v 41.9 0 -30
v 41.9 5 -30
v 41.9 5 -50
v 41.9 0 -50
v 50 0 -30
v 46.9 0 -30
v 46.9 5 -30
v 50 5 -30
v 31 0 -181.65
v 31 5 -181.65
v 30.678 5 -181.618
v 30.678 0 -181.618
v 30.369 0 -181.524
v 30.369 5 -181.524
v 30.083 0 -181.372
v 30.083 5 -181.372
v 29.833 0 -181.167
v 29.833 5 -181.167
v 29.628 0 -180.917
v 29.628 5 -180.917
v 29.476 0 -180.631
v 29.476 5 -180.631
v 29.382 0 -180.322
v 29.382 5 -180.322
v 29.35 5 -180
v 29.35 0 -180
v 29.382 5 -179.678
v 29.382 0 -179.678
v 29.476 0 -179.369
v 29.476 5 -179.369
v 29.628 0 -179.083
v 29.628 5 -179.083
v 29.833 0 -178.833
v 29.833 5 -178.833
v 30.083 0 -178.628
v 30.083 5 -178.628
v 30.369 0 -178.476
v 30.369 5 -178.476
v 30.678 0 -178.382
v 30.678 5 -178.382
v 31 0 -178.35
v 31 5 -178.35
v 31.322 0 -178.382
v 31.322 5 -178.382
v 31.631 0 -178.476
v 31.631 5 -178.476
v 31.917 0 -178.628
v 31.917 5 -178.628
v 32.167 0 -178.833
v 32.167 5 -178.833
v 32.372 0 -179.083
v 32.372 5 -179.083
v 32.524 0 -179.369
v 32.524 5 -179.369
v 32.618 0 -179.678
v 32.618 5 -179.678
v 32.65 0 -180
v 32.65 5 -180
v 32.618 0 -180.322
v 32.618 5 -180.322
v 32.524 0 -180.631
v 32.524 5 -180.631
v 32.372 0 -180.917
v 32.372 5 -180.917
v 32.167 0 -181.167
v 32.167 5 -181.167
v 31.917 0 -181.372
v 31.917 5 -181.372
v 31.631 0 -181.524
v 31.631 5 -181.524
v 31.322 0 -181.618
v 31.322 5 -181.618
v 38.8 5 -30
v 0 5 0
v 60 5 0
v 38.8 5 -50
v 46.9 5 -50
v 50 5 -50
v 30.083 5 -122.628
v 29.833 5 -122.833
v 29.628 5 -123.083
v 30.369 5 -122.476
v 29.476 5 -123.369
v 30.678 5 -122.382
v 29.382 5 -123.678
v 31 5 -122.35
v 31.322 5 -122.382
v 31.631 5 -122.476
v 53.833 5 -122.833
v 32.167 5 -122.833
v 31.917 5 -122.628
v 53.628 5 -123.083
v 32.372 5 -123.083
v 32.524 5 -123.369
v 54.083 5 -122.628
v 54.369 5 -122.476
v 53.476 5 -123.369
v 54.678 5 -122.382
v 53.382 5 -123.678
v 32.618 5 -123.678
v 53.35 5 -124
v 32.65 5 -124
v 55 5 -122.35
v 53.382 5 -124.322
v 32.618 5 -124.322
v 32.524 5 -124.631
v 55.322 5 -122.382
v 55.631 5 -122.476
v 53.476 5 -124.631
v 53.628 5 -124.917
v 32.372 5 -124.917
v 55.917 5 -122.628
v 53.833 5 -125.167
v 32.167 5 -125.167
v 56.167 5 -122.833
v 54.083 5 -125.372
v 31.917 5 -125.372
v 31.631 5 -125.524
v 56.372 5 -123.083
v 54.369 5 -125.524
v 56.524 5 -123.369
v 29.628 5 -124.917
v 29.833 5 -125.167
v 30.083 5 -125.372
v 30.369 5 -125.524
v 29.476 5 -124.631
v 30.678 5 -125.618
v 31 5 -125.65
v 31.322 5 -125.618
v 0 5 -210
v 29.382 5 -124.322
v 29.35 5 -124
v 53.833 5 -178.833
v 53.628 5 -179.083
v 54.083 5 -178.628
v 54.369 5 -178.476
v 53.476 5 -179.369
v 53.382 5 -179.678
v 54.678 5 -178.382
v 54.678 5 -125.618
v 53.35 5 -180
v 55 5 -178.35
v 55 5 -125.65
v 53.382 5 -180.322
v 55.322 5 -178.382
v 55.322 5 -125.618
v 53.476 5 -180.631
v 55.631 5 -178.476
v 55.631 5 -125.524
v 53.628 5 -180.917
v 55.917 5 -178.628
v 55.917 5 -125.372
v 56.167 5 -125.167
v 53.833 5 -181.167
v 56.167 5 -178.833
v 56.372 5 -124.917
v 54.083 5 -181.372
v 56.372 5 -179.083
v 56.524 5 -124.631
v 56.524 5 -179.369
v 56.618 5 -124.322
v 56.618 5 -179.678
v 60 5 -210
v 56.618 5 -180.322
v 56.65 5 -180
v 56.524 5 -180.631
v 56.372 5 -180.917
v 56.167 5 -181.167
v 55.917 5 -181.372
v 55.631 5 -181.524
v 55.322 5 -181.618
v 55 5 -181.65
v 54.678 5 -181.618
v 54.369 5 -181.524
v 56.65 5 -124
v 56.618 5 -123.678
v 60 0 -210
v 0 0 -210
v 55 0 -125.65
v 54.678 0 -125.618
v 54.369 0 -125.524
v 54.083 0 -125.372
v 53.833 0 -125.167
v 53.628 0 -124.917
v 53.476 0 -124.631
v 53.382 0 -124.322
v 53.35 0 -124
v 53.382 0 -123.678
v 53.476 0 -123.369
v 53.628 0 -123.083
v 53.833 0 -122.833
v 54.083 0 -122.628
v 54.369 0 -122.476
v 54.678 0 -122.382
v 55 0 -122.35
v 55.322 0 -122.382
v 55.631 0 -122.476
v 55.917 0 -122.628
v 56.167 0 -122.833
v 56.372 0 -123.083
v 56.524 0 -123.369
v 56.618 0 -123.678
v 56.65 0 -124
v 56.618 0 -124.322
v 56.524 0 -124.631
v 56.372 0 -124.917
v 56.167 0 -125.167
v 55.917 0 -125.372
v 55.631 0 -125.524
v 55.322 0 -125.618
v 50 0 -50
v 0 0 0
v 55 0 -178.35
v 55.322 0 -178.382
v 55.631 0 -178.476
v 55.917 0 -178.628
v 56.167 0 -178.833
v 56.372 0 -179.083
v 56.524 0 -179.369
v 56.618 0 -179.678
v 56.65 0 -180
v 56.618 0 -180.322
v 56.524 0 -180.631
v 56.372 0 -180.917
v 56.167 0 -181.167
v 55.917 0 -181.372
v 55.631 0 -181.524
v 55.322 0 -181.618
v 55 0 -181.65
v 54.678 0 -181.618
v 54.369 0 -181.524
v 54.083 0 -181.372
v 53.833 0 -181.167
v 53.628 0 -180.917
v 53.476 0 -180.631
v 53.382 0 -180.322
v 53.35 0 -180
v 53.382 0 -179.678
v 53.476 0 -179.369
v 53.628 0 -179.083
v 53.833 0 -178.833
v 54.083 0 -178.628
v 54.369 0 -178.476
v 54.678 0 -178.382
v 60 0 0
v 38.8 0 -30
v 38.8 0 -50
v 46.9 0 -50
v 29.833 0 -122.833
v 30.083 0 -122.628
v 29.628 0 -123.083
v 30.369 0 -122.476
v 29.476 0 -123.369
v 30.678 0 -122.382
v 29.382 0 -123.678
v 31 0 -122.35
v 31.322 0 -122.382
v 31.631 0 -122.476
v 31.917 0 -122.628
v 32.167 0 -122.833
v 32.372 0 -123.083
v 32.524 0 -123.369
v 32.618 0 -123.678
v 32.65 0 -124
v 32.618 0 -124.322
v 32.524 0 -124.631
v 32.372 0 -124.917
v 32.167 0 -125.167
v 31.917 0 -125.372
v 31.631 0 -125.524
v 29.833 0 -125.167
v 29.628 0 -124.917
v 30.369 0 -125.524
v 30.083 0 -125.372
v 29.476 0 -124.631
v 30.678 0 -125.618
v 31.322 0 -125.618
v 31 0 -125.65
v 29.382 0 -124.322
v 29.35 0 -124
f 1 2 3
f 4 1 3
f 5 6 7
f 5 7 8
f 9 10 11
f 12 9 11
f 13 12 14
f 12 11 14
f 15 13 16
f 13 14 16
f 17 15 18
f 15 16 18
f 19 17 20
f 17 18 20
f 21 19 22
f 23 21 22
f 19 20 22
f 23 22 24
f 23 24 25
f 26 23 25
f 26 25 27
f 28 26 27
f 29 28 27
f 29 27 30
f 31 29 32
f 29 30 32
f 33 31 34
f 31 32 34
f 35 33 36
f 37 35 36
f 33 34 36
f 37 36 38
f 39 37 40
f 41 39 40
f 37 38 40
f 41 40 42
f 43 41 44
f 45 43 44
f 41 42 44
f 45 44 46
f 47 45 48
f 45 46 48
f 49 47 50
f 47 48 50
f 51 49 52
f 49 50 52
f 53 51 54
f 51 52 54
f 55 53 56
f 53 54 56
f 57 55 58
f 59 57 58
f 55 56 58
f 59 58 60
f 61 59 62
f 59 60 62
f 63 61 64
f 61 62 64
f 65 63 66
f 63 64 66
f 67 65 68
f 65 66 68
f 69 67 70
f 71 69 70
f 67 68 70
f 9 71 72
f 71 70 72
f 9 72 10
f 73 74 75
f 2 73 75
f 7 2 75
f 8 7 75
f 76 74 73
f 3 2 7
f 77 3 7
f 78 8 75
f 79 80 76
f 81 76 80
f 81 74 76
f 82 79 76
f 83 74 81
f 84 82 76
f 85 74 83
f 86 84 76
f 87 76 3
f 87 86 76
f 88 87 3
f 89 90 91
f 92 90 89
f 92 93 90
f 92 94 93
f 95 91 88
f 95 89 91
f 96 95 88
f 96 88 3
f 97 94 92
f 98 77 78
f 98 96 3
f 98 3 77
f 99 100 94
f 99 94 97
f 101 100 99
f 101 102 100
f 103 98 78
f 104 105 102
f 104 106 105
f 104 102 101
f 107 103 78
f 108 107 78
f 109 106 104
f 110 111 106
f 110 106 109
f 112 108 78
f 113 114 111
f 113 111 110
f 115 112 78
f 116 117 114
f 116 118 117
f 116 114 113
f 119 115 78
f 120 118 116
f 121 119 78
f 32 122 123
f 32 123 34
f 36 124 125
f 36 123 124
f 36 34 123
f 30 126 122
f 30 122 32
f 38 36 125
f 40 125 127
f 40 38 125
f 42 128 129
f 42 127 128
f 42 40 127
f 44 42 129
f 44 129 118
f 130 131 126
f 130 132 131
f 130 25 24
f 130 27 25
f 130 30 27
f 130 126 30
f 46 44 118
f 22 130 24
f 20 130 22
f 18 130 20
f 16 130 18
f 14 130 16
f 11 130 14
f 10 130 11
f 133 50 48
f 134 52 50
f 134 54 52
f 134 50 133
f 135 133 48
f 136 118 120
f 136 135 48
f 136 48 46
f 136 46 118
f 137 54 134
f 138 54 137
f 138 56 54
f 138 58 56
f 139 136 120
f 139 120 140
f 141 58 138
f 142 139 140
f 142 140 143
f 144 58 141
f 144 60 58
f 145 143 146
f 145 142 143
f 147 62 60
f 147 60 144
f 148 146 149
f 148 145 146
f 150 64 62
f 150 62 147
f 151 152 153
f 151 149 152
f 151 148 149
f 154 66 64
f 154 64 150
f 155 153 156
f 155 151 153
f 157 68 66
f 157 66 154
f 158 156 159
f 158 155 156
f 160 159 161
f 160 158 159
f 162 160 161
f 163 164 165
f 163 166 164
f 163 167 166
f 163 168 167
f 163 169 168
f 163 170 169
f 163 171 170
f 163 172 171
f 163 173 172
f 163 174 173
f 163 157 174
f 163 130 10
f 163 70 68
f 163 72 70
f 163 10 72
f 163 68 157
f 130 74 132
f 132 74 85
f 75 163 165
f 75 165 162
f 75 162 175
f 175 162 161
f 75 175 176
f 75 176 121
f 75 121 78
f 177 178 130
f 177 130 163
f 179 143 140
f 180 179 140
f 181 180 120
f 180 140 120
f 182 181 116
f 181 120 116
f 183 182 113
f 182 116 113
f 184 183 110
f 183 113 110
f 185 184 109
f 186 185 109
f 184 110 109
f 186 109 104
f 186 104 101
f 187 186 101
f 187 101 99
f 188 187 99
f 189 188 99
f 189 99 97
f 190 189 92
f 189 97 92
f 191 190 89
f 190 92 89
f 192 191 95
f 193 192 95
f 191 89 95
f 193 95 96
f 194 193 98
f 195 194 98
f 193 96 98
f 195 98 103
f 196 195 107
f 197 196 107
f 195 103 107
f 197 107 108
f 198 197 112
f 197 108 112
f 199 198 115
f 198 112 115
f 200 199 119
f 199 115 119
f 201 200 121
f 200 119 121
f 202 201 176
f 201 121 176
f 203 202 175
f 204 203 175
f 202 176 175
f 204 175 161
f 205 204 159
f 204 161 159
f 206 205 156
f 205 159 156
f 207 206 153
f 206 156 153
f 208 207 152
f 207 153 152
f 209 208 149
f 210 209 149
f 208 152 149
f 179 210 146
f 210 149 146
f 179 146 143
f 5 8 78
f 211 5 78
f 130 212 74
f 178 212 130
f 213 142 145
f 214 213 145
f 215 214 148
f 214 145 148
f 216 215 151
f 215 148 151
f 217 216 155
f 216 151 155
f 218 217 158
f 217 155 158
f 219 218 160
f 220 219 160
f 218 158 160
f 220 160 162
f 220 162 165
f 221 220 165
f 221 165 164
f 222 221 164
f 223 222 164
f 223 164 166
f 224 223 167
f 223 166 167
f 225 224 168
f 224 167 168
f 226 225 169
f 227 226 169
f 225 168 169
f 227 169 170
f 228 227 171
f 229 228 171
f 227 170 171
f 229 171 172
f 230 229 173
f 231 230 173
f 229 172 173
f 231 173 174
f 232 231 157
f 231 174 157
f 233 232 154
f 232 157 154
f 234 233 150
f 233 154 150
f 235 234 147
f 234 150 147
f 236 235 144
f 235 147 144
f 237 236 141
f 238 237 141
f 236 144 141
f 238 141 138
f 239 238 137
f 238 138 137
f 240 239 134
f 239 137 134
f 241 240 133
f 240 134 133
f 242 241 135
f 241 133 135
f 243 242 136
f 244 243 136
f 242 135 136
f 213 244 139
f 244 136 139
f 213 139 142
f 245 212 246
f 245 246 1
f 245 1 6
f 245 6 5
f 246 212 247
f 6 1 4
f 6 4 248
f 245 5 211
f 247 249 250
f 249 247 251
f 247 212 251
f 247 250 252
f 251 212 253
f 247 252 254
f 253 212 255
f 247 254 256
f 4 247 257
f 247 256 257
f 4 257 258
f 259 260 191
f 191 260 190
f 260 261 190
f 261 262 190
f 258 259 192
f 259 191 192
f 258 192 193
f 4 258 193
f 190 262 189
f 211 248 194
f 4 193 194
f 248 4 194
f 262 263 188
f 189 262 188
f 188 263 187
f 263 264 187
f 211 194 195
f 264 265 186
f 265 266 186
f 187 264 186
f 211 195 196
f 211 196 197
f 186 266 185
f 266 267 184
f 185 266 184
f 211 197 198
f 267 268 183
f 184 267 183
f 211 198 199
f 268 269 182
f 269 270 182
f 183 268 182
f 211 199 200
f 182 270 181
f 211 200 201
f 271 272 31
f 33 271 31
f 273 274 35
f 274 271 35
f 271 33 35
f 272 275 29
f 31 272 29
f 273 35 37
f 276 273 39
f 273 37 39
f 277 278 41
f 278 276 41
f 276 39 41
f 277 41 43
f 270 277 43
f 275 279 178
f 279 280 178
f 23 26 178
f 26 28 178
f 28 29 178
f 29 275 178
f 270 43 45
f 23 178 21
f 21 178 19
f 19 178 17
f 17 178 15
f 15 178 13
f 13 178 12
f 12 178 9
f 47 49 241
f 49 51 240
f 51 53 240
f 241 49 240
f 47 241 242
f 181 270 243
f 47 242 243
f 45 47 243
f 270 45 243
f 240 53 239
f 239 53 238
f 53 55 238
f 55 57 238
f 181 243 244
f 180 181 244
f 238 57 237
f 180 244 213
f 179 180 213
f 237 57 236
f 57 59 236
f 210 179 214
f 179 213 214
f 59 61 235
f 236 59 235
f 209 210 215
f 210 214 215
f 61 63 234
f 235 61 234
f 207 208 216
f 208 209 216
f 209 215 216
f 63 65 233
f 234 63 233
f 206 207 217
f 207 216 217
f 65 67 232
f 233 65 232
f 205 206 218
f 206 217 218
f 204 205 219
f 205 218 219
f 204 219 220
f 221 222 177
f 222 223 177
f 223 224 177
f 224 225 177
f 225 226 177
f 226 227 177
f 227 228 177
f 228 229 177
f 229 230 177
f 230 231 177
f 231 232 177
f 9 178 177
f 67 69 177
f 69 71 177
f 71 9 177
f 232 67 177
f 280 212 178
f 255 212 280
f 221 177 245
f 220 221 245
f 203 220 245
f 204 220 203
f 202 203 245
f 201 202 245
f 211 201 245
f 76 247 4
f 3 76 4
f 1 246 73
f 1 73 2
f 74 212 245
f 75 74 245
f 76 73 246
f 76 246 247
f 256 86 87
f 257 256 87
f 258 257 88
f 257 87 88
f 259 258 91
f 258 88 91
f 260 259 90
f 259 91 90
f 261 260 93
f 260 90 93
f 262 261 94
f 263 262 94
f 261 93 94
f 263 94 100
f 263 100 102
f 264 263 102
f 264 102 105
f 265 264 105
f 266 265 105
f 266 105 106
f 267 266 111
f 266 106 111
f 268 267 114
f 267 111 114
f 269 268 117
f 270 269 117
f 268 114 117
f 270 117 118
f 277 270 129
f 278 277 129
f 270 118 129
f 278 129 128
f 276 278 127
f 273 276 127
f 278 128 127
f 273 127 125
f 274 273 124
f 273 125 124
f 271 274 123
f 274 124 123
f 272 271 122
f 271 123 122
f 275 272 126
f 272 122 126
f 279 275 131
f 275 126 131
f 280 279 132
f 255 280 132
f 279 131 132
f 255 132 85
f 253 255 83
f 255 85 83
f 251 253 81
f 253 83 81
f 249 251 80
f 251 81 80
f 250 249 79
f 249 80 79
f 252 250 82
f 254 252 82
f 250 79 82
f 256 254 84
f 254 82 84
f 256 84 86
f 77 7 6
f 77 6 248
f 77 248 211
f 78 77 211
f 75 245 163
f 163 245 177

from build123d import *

# Parameters (mm, degrees)
SKETCH1_W           = 60
SKETCH1_H           = 210
BOSS_EXTRUDE1_DEPTH = 5
SKETCH2_W           = 3.1
SKETCH2_H           = 20
CUT_EXTRUDE1_DEPTH  = 5
SKETCH3_R           = 1.65
CUT_EXTRUDE2_DEPTH  = 5


with BuildPart() as part:
    # Sketch1 → Boss-Extrude1 (new body)
    with BuildSketch(Plane(origin=(0, 0, 0), x_dir=(1, 0, 0), z_dir=(0, 1, 0))):
        with Locations((30, 105)):
            Rectangle(SKETCH1_W, SKETCH1_H)
    extrude(amount=BOSS_EXTRUDE1_DEPTH)

    # Sketch2 → Cut-Extrude1 (cut)
    with BuildSketch(Plane(origin=(0, 5, 0), x_dir=(1, 0, 0), z_dir=(0, 1, 0))):
        with Locations((48.45, 40)):
            Rectangle(SKETCH2_W, SKETCH2_H)
        with Locations((40.35, 40)):
            Rectangle(SKETCH2_W, SKETCH2_H)
    extrude(amount=-CUT_EXTRUDE1_DEPTH, mode=Mode.SUBTRACT)

    # Sketch3 → Cut-Extrude2 (cut)
    with BuildSketch(Plane(origin=(0, 5, 0), x_dir=(1, 0, 0), z_dir=(0, 1, 0))):
        with Locations(Location((55, 180, 0), (0, 0, 270))):
            Circle(SKETCH3_R)
        with Locations(Location((55, 124, 0), (0, 0, 90))):
            Circle(SKETCH3_R)
        with Locations(Location((31, 124, 0), (0, 0, 270))):
            Circle(SKETCH3_R)
        with Locations(Location((31, 180, 0), (0, 0, 90))):
            Circle(SKETCH3_R)
    extrude(amount=-CUT_EXTRUDE2_DEPTH, mode=Mode.SUBTRACT)


solid = part.part
